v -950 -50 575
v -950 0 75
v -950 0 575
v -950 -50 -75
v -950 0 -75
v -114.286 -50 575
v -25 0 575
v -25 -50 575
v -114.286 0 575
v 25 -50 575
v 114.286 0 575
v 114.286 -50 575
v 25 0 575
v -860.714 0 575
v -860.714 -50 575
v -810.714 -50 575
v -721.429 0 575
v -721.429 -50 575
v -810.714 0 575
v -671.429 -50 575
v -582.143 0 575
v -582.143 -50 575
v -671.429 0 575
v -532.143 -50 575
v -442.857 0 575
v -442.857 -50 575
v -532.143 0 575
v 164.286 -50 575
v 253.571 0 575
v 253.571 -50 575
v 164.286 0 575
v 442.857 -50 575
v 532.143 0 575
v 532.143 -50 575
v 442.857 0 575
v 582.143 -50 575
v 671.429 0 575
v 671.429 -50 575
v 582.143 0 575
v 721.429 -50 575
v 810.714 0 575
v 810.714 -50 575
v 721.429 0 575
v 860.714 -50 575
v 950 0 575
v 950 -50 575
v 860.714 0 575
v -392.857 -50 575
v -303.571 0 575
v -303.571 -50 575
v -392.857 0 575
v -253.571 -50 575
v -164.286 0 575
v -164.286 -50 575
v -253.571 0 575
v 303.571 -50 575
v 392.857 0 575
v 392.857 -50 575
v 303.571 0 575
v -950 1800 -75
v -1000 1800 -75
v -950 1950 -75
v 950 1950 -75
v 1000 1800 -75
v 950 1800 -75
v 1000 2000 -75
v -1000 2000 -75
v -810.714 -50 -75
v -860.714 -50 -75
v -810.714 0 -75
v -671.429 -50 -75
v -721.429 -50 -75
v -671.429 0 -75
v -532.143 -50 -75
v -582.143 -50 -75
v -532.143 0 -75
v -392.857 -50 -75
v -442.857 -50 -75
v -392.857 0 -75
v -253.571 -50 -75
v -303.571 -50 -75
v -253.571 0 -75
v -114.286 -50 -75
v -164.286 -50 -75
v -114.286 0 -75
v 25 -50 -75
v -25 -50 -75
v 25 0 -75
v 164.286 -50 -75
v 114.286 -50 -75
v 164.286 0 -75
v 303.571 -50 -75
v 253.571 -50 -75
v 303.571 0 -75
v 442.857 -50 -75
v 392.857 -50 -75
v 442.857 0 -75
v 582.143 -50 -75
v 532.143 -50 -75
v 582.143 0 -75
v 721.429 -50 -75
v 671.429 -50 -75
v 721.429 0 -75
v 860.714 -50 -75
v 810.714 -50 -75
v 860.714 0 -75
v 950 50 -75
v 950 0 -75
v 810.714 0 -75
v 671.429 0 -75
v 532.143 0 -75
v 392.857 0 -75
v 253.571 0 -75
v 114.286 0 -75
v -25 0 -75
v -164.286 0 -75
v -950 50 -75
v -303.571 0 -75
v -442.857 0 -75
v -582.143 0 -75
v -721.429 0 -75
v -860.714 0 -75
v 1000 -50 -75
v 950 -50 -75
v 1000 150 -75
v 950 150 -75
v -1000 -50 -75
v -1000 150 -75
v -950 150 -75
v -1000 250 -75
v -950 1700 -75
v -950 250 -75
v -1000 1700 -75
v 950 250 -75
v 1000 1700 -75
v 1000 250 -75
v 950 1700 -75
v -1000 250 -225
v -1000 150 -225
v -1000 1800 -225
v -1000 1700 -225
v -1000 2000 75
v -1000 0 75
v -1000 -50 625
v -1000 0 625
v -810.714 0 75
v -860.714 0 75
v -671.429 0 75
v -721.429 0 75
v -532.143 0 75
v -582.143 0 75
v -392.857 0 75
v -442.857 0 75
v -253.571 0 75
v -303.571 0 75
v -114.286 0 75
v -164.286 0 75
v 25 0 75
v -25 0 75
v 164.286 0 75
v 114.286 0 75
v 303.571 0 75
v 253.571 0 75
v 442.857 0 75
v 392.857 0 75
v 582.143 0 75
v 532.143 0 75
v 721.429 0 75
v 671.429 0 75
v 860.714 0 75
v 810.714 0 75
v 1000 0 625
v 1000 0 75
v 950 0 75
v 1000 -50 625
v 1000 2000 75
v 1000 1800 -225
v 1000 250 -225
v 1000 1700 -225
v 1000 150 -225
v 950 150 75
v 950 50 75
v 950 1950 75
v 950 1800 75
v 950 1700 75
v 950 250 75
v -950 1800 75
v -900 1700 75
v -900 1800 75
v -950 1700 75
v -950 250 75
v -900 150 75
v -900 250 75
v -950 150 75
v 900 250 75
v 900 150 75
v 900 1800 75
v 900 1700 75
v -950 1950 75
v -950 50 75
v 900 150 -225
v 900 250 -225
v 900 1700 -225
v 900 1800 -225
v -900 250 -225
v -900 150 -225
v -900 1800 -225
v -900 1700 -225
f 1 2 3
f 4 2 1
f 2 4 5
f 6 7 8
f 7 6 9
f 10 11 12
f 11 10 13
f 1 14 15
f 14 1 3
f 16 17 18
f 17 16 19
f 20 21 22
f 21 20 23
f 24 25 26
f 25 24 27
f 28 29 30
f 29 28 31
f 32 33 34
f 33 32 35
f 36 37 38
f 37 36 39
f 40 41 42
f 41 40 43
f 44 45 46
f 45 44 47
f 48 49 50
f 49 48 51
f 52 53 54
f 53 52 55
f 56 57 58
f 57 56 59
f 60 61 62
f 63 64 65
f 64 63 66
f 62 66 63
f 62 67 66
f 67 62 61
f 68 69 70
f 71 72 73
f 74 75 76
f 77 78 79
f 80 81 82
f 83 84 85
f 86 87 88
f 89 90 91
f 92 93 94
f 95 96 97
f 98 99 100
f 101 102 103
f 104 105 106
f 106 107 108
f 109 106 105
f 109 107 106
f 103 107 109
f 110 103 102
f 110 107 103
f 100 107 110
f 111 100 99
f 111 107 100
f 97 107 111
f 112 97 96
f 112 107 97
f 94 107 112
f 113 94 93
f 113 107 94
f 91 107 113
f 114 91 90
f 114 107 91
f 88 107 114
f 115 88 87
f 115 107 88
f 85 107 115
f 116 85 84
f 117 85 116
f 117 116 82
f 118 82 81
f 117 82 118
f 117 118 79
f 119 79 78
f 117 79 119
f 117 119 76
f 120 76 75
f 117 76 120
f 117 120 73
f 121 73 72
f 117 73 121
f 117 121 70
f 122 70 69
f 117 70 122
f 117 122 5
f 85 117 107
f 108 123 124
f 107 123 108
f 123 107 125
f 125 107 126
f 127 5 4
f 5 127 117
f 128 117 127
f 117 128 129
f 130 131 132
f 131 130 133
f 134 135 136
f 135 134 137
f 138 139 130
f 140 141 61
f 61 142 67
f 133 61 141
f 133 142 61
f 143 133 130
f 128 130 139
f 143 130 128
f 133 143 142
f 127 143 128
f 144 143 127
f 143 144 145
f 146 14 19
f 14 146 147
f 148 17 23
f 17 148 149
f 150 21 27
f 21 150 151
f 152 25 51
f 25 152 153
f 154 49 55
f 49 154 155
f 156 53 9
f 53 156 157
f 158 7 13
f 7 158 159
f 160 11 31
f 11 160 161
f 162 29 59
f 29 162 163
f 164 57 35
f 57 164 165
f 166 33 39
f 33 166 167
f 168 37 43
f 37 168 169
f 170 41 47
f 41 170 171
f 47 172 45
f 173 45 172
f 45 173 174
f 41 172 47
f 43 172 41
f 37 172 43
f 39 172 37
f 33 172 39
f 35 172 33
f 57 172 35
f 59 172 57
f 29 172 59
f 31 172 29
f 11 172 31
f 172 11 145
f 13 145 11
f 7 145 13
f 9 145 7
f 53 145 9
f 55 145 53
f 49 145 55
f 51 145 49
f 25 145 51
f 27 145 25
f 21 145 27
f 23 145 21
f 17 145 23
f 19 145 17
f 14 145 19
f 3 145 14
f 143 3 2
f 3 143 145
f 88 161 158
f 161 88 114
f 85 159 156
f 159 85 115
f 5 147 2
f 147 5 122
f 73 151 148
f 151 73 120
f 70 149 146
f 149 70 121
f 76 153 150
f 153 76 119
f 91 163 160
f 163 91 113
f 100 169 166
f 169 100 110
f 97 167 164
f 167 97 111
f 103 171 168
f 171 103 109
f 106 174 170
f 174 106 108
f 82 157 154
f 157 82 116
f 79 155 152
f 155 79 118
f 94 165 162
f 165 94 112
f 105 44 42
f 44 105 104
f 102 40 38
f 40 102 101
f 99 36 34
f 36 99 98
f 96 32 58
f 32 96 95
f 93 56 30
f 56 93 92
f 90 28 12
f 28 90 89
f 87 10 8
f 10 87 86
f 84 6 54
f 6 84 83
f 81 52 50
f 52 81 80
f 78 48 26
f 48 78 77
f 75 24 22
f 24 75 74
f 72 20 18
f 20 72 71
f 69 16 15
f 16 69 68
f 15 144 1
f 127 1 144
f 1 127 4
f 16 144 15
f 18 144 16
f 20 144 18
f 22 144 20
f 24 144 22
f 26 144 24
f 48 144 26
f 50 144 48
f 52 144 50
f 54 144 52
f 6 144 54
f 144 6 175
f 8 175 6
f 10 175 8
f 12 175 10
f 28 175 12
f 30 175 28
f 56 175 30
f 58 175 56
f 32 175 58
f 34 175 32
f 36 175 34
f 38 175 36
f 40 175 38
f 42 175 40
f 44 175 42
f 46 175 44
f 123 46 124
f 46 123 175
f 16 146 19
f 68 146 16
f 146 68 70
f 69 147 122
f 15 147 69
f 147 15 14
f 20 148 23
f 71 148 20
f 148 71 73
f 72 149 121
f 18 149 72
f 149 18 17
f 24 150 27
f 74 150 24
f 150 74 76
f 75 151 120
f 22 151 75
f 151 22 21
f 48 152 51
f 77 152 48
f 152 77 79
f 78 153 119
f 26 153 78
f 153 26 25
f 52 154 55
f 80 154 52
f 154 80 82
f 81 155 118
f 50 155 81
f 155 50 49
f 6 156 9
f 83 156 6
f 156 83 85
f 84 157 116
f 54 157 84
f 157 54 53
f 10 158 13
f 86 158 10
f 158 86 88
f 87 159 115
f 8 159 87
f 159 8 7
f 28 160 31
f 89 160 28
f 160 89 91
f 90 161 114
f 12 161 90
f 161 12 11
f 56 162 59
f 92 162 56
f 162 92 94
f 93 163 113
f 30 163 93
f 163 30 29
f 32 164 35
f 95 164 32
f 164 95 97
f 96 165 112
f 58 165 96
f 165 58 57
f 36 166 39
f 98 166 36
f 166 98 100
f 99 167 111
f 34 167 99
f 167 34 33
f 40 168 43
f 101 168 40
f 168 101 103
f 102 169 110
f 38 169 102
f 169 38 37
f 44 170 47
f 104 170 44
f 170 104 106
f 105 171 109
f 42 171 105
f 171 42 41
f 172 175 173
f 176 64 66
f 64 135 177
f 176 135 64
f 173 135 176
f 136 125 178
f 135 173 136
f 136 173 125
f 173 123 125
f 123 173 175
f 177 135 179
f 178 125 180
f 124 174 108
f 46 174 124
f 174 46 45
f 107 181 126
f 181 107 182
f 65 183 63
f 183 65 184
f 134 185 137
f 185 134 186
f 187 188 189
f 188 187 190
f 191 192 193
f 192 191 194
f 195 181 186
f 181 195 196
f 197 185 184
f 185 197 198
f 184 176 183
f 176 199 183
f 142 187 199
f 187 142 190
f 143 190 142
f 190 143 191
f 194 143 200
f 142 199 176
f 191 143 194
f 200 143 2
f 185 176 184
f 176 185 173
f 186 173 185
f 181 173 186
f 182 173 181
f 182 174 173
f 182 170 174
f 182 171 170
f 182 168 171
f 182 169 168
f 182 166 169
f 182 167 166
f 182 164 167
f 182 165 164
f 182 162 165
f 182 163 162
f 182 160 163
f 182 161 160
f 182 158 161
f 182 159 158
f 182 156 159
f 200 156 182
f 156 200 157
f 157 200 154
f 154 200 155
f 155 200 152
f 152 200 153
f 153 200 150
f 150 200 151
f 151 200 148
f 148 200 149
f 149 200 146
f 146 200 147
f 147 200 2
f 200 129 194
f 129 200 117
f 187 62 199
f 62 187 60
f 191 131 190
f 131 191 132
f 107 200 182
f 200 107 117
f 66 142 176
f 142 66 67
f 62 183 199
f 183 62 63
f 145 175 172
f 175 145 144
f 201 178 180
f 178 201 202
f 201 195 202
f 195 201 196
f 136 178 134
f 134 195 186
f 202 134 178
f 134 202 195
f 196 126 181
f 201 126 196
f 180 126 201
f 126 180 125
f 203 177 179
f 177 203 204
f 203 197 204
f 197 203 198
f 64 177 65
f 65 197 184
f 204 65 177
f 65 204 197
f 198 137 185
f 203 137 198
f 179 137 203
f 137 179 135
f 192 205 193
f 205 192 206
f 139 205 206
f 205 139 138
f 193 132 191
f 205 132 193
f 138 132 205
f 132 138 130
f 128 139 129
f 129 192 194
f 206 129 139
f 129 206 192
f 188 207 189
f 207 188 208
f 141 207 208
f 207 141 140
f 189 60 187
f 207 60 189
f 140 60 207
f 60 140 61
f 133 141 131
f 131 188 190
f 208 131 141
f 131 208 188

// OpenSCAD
th = 50;
wd = 150;
sy = 2000;
sx = 2000;
h = 500 + wd;
nbr = 15;
fh = 150;
inset = 150;

module stick(l) {
    echo("stick l =", l);
    cube([th, th, l], center = true);
}

module plank(l) {
    echo("plank l =", l);
    cube([l, th, wd], center = true);
}

module foot(l) {
    echo("foot l =", l);
    cube([2*th, 2*th, l], center = true);
}

//stick(500);
// Head
translate([0, th/2, 0]) plank(sx - 2*th);
// Feet
translate([0, sy - th/2, 0]) plank(sx - 2*th);
// Left
translate([sx/2 - th/2, sy/2, 0]) rotate([0,0,90]) plank(sy);
// Right
translate([-sx/2 + th/2, sy/2, 0]) rotate([0,0,90]) plank(sy);

// Back-rest
for (i = [0:nbr - 1])
    translate( [i*(sx - th)/(nbr - 1) - sx/2 + th/2
             , -th/2
             , (h - wd)/2])
    stick(h);
// Back-rest top
translate([0, -th/2, h - th]) rotate([0, 90, 0]) stick(sx);

// Bed feet left
fl = fh + wd;
xoff = sx/2 - th;
yoff = (wd - fl)/2;
translate([xoff, th + inset, yoff]) foot(fl);
translate([xoff, sy - 2*th - inset, yoff]) foot(fl);

// Bed feet right
translate([-xoff, th + inset, yoff]) foot(fl);
translate([-xoff, sy - 2*th - inset, yoff]) foot(fl);
